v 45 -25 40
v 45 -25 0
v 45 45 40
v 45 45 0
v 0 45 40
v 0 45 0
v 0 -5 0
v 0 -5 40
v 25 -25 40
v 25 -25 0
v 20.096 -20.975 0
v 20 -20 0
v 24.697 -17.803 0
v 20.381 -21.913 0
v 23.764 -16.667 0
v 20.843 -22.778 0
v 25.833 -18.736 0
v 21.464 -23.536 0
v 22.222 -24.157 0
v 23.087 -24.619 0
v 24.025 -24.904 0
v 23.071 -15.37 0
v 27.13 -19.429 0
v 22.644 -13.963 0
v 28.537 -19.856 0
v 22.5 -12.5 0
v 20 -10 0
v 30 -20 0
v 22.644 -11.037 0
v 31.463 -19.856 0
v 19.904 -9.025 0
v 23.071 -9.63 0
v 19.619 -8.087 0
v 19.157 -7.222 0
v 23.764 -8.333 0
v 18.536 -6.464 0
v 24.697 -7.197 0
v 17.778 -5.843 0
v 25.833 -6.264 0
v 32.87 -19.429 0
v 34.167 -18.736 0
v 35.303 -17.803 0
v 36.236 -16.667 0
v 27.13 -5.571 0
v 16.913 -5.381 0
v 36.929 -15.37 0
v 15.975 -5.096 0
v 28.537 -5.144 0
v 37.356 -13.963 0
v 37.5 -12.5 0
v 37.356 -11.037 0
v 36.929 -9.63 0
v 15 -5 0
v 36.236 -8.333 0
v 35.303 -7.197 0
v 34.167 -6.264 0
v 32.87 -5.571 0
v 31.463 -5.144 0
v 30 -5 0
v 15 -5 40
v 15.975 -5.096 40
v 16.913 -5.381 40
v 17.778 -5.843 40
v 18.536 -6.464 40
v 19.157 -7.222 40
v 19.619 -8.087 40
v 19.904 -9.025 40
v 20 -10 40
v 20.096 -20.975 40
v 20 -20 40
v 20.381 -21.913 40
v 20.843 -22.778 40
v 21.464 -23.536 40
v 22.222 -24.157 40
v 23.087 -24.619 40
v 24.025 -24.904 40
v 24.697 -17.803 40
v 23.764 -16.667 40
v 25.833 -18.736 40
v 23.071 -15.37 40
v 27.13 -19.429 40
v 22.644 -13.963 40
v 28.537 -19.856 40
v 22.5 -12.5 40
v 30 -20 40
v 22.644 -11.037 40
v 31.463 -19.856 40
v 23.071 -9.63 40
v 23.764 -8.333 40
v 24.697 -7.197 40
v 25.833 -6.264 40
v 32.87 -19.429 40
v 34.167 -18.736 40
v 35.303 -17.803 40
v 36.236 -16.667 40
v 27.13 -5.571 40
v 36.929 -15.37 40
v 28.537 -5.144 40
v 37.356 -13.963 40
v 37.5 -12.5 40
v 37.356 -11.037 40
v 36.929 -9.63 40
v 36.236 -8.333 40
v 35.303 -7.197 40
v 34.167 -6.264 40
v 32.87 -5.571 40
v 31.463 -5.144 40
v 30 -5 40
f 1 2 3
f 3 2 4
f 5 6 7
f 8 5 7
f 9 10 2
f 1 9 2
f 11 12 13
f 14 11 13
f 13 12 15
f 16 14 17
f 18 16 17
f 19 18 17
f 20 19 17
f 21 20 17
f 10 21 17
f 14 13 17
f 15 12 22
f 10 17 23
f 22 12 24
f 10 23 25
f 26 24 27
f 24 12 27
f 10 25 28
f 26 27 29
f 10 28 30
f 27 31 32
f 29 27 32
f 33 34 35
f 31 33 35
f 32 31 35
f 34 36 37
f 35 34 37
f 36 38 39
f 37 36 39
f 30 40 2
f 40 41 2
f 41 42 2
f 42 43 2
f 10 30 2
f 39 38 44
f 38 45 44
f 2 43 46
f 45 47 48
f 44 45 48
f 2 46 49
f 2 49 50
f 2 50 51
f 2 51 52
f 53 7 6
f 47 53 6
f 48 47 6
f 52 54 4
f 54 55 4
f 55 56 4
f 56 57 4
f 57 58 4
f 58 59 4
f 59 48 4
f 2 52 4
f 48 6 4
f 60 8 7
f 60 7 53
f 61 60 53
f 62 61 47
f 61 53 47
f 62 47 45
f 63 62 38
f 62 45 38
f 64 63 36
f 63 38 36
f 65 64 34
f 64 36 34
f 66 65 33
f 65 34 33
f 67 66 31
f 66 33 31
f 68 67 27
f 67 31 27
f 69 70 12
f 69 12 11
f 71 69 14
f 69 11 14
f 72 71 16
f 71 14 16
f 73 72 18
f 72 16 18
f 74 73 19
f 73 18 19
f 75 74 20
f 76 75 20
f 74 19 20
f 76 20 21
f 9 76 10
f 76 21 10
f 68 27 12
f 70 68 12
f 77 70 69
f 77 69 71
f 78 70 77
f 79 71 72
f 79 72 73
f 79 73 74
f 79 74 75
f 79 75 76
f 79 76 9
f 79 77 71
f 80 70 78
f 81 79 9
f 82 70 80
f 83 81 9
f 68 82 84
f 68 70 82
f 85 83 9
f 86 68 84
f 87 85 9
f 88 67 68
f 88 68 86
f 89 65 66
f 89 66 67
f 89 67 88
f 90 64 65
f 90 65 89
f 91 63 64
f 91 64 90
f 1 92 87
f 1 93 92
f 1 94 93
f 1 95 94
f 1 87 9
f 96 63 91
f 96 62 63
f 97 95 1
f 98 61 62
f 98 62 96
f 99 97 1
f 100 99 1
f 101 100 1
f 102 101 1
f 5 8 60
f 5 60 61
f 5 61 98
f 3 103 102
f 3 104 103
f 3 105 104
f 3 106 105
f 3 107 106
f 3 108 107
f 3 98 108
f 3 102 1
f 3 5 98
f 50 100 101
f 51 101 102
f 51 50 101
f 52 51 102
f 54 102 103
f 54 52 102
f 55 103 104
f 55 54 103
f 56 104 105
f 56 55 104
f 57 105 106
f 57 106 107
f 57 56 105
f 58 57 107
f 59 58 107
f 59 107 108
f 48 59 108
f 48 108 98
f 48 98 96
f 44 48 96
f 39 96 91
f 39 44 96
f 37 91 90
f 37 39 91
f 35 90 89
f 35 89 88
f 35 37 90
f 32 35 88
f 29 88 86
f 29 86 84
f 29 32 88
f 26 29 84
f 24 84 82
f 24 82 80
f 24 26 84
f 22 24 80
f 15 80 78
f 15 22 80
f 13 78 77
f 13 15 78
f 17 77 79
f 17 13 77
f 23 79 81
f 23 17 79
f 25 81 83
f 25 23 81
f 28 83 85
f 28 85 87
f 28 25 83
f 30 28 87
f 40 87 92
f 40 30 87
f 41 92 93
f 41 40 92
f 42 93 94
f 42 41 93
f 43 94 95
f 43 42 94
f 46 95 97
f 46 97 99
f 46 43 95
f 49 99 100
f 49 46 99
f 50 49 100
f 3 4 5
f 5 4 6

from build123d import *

# Parameters (mm, degrees)
F0_R     = 7.5
F1_DEPTH = 40


# Not quite as in the source:
# - a feature names something its author has since deleted; it is built from what else it names


with BuildPart() as f1:
    # F0 (on Top) → F1 (new body)
    with BuildSketch(Plane.XY):
        with BuildLine():
            Line((40, 0), (0, 0))
            Line((0, 0), (0, -5))
            Line((0, -5), (15, -5))
            ThreePointArc((15, -5), (18.5355339059, -6.4644660941), (20, -10))
            Line((20, -10), (20, -20))
            ThreePointArc((20, -20), (21.4644660941, -23.5355339059), (25, -25))
            Line((25, -25), (35, -25))
            Line((35, -25), (45, -25))
            Line((45, -25), (45, -19.1631559283))
            Line((45, -19.1631559283), (45, 0))
            Line((45, 0), (40, 0))
        make_face()
        with Locations((30, -12.5)):
            Circle(F0_R, mode=Mode.SUBTRACT)
        Polygon((0, 45), (0, 0), (40, 0), (45, 0), (45, 45), align=None)
    extrude(amount=F1_DEPTH)


solid = f1.part
